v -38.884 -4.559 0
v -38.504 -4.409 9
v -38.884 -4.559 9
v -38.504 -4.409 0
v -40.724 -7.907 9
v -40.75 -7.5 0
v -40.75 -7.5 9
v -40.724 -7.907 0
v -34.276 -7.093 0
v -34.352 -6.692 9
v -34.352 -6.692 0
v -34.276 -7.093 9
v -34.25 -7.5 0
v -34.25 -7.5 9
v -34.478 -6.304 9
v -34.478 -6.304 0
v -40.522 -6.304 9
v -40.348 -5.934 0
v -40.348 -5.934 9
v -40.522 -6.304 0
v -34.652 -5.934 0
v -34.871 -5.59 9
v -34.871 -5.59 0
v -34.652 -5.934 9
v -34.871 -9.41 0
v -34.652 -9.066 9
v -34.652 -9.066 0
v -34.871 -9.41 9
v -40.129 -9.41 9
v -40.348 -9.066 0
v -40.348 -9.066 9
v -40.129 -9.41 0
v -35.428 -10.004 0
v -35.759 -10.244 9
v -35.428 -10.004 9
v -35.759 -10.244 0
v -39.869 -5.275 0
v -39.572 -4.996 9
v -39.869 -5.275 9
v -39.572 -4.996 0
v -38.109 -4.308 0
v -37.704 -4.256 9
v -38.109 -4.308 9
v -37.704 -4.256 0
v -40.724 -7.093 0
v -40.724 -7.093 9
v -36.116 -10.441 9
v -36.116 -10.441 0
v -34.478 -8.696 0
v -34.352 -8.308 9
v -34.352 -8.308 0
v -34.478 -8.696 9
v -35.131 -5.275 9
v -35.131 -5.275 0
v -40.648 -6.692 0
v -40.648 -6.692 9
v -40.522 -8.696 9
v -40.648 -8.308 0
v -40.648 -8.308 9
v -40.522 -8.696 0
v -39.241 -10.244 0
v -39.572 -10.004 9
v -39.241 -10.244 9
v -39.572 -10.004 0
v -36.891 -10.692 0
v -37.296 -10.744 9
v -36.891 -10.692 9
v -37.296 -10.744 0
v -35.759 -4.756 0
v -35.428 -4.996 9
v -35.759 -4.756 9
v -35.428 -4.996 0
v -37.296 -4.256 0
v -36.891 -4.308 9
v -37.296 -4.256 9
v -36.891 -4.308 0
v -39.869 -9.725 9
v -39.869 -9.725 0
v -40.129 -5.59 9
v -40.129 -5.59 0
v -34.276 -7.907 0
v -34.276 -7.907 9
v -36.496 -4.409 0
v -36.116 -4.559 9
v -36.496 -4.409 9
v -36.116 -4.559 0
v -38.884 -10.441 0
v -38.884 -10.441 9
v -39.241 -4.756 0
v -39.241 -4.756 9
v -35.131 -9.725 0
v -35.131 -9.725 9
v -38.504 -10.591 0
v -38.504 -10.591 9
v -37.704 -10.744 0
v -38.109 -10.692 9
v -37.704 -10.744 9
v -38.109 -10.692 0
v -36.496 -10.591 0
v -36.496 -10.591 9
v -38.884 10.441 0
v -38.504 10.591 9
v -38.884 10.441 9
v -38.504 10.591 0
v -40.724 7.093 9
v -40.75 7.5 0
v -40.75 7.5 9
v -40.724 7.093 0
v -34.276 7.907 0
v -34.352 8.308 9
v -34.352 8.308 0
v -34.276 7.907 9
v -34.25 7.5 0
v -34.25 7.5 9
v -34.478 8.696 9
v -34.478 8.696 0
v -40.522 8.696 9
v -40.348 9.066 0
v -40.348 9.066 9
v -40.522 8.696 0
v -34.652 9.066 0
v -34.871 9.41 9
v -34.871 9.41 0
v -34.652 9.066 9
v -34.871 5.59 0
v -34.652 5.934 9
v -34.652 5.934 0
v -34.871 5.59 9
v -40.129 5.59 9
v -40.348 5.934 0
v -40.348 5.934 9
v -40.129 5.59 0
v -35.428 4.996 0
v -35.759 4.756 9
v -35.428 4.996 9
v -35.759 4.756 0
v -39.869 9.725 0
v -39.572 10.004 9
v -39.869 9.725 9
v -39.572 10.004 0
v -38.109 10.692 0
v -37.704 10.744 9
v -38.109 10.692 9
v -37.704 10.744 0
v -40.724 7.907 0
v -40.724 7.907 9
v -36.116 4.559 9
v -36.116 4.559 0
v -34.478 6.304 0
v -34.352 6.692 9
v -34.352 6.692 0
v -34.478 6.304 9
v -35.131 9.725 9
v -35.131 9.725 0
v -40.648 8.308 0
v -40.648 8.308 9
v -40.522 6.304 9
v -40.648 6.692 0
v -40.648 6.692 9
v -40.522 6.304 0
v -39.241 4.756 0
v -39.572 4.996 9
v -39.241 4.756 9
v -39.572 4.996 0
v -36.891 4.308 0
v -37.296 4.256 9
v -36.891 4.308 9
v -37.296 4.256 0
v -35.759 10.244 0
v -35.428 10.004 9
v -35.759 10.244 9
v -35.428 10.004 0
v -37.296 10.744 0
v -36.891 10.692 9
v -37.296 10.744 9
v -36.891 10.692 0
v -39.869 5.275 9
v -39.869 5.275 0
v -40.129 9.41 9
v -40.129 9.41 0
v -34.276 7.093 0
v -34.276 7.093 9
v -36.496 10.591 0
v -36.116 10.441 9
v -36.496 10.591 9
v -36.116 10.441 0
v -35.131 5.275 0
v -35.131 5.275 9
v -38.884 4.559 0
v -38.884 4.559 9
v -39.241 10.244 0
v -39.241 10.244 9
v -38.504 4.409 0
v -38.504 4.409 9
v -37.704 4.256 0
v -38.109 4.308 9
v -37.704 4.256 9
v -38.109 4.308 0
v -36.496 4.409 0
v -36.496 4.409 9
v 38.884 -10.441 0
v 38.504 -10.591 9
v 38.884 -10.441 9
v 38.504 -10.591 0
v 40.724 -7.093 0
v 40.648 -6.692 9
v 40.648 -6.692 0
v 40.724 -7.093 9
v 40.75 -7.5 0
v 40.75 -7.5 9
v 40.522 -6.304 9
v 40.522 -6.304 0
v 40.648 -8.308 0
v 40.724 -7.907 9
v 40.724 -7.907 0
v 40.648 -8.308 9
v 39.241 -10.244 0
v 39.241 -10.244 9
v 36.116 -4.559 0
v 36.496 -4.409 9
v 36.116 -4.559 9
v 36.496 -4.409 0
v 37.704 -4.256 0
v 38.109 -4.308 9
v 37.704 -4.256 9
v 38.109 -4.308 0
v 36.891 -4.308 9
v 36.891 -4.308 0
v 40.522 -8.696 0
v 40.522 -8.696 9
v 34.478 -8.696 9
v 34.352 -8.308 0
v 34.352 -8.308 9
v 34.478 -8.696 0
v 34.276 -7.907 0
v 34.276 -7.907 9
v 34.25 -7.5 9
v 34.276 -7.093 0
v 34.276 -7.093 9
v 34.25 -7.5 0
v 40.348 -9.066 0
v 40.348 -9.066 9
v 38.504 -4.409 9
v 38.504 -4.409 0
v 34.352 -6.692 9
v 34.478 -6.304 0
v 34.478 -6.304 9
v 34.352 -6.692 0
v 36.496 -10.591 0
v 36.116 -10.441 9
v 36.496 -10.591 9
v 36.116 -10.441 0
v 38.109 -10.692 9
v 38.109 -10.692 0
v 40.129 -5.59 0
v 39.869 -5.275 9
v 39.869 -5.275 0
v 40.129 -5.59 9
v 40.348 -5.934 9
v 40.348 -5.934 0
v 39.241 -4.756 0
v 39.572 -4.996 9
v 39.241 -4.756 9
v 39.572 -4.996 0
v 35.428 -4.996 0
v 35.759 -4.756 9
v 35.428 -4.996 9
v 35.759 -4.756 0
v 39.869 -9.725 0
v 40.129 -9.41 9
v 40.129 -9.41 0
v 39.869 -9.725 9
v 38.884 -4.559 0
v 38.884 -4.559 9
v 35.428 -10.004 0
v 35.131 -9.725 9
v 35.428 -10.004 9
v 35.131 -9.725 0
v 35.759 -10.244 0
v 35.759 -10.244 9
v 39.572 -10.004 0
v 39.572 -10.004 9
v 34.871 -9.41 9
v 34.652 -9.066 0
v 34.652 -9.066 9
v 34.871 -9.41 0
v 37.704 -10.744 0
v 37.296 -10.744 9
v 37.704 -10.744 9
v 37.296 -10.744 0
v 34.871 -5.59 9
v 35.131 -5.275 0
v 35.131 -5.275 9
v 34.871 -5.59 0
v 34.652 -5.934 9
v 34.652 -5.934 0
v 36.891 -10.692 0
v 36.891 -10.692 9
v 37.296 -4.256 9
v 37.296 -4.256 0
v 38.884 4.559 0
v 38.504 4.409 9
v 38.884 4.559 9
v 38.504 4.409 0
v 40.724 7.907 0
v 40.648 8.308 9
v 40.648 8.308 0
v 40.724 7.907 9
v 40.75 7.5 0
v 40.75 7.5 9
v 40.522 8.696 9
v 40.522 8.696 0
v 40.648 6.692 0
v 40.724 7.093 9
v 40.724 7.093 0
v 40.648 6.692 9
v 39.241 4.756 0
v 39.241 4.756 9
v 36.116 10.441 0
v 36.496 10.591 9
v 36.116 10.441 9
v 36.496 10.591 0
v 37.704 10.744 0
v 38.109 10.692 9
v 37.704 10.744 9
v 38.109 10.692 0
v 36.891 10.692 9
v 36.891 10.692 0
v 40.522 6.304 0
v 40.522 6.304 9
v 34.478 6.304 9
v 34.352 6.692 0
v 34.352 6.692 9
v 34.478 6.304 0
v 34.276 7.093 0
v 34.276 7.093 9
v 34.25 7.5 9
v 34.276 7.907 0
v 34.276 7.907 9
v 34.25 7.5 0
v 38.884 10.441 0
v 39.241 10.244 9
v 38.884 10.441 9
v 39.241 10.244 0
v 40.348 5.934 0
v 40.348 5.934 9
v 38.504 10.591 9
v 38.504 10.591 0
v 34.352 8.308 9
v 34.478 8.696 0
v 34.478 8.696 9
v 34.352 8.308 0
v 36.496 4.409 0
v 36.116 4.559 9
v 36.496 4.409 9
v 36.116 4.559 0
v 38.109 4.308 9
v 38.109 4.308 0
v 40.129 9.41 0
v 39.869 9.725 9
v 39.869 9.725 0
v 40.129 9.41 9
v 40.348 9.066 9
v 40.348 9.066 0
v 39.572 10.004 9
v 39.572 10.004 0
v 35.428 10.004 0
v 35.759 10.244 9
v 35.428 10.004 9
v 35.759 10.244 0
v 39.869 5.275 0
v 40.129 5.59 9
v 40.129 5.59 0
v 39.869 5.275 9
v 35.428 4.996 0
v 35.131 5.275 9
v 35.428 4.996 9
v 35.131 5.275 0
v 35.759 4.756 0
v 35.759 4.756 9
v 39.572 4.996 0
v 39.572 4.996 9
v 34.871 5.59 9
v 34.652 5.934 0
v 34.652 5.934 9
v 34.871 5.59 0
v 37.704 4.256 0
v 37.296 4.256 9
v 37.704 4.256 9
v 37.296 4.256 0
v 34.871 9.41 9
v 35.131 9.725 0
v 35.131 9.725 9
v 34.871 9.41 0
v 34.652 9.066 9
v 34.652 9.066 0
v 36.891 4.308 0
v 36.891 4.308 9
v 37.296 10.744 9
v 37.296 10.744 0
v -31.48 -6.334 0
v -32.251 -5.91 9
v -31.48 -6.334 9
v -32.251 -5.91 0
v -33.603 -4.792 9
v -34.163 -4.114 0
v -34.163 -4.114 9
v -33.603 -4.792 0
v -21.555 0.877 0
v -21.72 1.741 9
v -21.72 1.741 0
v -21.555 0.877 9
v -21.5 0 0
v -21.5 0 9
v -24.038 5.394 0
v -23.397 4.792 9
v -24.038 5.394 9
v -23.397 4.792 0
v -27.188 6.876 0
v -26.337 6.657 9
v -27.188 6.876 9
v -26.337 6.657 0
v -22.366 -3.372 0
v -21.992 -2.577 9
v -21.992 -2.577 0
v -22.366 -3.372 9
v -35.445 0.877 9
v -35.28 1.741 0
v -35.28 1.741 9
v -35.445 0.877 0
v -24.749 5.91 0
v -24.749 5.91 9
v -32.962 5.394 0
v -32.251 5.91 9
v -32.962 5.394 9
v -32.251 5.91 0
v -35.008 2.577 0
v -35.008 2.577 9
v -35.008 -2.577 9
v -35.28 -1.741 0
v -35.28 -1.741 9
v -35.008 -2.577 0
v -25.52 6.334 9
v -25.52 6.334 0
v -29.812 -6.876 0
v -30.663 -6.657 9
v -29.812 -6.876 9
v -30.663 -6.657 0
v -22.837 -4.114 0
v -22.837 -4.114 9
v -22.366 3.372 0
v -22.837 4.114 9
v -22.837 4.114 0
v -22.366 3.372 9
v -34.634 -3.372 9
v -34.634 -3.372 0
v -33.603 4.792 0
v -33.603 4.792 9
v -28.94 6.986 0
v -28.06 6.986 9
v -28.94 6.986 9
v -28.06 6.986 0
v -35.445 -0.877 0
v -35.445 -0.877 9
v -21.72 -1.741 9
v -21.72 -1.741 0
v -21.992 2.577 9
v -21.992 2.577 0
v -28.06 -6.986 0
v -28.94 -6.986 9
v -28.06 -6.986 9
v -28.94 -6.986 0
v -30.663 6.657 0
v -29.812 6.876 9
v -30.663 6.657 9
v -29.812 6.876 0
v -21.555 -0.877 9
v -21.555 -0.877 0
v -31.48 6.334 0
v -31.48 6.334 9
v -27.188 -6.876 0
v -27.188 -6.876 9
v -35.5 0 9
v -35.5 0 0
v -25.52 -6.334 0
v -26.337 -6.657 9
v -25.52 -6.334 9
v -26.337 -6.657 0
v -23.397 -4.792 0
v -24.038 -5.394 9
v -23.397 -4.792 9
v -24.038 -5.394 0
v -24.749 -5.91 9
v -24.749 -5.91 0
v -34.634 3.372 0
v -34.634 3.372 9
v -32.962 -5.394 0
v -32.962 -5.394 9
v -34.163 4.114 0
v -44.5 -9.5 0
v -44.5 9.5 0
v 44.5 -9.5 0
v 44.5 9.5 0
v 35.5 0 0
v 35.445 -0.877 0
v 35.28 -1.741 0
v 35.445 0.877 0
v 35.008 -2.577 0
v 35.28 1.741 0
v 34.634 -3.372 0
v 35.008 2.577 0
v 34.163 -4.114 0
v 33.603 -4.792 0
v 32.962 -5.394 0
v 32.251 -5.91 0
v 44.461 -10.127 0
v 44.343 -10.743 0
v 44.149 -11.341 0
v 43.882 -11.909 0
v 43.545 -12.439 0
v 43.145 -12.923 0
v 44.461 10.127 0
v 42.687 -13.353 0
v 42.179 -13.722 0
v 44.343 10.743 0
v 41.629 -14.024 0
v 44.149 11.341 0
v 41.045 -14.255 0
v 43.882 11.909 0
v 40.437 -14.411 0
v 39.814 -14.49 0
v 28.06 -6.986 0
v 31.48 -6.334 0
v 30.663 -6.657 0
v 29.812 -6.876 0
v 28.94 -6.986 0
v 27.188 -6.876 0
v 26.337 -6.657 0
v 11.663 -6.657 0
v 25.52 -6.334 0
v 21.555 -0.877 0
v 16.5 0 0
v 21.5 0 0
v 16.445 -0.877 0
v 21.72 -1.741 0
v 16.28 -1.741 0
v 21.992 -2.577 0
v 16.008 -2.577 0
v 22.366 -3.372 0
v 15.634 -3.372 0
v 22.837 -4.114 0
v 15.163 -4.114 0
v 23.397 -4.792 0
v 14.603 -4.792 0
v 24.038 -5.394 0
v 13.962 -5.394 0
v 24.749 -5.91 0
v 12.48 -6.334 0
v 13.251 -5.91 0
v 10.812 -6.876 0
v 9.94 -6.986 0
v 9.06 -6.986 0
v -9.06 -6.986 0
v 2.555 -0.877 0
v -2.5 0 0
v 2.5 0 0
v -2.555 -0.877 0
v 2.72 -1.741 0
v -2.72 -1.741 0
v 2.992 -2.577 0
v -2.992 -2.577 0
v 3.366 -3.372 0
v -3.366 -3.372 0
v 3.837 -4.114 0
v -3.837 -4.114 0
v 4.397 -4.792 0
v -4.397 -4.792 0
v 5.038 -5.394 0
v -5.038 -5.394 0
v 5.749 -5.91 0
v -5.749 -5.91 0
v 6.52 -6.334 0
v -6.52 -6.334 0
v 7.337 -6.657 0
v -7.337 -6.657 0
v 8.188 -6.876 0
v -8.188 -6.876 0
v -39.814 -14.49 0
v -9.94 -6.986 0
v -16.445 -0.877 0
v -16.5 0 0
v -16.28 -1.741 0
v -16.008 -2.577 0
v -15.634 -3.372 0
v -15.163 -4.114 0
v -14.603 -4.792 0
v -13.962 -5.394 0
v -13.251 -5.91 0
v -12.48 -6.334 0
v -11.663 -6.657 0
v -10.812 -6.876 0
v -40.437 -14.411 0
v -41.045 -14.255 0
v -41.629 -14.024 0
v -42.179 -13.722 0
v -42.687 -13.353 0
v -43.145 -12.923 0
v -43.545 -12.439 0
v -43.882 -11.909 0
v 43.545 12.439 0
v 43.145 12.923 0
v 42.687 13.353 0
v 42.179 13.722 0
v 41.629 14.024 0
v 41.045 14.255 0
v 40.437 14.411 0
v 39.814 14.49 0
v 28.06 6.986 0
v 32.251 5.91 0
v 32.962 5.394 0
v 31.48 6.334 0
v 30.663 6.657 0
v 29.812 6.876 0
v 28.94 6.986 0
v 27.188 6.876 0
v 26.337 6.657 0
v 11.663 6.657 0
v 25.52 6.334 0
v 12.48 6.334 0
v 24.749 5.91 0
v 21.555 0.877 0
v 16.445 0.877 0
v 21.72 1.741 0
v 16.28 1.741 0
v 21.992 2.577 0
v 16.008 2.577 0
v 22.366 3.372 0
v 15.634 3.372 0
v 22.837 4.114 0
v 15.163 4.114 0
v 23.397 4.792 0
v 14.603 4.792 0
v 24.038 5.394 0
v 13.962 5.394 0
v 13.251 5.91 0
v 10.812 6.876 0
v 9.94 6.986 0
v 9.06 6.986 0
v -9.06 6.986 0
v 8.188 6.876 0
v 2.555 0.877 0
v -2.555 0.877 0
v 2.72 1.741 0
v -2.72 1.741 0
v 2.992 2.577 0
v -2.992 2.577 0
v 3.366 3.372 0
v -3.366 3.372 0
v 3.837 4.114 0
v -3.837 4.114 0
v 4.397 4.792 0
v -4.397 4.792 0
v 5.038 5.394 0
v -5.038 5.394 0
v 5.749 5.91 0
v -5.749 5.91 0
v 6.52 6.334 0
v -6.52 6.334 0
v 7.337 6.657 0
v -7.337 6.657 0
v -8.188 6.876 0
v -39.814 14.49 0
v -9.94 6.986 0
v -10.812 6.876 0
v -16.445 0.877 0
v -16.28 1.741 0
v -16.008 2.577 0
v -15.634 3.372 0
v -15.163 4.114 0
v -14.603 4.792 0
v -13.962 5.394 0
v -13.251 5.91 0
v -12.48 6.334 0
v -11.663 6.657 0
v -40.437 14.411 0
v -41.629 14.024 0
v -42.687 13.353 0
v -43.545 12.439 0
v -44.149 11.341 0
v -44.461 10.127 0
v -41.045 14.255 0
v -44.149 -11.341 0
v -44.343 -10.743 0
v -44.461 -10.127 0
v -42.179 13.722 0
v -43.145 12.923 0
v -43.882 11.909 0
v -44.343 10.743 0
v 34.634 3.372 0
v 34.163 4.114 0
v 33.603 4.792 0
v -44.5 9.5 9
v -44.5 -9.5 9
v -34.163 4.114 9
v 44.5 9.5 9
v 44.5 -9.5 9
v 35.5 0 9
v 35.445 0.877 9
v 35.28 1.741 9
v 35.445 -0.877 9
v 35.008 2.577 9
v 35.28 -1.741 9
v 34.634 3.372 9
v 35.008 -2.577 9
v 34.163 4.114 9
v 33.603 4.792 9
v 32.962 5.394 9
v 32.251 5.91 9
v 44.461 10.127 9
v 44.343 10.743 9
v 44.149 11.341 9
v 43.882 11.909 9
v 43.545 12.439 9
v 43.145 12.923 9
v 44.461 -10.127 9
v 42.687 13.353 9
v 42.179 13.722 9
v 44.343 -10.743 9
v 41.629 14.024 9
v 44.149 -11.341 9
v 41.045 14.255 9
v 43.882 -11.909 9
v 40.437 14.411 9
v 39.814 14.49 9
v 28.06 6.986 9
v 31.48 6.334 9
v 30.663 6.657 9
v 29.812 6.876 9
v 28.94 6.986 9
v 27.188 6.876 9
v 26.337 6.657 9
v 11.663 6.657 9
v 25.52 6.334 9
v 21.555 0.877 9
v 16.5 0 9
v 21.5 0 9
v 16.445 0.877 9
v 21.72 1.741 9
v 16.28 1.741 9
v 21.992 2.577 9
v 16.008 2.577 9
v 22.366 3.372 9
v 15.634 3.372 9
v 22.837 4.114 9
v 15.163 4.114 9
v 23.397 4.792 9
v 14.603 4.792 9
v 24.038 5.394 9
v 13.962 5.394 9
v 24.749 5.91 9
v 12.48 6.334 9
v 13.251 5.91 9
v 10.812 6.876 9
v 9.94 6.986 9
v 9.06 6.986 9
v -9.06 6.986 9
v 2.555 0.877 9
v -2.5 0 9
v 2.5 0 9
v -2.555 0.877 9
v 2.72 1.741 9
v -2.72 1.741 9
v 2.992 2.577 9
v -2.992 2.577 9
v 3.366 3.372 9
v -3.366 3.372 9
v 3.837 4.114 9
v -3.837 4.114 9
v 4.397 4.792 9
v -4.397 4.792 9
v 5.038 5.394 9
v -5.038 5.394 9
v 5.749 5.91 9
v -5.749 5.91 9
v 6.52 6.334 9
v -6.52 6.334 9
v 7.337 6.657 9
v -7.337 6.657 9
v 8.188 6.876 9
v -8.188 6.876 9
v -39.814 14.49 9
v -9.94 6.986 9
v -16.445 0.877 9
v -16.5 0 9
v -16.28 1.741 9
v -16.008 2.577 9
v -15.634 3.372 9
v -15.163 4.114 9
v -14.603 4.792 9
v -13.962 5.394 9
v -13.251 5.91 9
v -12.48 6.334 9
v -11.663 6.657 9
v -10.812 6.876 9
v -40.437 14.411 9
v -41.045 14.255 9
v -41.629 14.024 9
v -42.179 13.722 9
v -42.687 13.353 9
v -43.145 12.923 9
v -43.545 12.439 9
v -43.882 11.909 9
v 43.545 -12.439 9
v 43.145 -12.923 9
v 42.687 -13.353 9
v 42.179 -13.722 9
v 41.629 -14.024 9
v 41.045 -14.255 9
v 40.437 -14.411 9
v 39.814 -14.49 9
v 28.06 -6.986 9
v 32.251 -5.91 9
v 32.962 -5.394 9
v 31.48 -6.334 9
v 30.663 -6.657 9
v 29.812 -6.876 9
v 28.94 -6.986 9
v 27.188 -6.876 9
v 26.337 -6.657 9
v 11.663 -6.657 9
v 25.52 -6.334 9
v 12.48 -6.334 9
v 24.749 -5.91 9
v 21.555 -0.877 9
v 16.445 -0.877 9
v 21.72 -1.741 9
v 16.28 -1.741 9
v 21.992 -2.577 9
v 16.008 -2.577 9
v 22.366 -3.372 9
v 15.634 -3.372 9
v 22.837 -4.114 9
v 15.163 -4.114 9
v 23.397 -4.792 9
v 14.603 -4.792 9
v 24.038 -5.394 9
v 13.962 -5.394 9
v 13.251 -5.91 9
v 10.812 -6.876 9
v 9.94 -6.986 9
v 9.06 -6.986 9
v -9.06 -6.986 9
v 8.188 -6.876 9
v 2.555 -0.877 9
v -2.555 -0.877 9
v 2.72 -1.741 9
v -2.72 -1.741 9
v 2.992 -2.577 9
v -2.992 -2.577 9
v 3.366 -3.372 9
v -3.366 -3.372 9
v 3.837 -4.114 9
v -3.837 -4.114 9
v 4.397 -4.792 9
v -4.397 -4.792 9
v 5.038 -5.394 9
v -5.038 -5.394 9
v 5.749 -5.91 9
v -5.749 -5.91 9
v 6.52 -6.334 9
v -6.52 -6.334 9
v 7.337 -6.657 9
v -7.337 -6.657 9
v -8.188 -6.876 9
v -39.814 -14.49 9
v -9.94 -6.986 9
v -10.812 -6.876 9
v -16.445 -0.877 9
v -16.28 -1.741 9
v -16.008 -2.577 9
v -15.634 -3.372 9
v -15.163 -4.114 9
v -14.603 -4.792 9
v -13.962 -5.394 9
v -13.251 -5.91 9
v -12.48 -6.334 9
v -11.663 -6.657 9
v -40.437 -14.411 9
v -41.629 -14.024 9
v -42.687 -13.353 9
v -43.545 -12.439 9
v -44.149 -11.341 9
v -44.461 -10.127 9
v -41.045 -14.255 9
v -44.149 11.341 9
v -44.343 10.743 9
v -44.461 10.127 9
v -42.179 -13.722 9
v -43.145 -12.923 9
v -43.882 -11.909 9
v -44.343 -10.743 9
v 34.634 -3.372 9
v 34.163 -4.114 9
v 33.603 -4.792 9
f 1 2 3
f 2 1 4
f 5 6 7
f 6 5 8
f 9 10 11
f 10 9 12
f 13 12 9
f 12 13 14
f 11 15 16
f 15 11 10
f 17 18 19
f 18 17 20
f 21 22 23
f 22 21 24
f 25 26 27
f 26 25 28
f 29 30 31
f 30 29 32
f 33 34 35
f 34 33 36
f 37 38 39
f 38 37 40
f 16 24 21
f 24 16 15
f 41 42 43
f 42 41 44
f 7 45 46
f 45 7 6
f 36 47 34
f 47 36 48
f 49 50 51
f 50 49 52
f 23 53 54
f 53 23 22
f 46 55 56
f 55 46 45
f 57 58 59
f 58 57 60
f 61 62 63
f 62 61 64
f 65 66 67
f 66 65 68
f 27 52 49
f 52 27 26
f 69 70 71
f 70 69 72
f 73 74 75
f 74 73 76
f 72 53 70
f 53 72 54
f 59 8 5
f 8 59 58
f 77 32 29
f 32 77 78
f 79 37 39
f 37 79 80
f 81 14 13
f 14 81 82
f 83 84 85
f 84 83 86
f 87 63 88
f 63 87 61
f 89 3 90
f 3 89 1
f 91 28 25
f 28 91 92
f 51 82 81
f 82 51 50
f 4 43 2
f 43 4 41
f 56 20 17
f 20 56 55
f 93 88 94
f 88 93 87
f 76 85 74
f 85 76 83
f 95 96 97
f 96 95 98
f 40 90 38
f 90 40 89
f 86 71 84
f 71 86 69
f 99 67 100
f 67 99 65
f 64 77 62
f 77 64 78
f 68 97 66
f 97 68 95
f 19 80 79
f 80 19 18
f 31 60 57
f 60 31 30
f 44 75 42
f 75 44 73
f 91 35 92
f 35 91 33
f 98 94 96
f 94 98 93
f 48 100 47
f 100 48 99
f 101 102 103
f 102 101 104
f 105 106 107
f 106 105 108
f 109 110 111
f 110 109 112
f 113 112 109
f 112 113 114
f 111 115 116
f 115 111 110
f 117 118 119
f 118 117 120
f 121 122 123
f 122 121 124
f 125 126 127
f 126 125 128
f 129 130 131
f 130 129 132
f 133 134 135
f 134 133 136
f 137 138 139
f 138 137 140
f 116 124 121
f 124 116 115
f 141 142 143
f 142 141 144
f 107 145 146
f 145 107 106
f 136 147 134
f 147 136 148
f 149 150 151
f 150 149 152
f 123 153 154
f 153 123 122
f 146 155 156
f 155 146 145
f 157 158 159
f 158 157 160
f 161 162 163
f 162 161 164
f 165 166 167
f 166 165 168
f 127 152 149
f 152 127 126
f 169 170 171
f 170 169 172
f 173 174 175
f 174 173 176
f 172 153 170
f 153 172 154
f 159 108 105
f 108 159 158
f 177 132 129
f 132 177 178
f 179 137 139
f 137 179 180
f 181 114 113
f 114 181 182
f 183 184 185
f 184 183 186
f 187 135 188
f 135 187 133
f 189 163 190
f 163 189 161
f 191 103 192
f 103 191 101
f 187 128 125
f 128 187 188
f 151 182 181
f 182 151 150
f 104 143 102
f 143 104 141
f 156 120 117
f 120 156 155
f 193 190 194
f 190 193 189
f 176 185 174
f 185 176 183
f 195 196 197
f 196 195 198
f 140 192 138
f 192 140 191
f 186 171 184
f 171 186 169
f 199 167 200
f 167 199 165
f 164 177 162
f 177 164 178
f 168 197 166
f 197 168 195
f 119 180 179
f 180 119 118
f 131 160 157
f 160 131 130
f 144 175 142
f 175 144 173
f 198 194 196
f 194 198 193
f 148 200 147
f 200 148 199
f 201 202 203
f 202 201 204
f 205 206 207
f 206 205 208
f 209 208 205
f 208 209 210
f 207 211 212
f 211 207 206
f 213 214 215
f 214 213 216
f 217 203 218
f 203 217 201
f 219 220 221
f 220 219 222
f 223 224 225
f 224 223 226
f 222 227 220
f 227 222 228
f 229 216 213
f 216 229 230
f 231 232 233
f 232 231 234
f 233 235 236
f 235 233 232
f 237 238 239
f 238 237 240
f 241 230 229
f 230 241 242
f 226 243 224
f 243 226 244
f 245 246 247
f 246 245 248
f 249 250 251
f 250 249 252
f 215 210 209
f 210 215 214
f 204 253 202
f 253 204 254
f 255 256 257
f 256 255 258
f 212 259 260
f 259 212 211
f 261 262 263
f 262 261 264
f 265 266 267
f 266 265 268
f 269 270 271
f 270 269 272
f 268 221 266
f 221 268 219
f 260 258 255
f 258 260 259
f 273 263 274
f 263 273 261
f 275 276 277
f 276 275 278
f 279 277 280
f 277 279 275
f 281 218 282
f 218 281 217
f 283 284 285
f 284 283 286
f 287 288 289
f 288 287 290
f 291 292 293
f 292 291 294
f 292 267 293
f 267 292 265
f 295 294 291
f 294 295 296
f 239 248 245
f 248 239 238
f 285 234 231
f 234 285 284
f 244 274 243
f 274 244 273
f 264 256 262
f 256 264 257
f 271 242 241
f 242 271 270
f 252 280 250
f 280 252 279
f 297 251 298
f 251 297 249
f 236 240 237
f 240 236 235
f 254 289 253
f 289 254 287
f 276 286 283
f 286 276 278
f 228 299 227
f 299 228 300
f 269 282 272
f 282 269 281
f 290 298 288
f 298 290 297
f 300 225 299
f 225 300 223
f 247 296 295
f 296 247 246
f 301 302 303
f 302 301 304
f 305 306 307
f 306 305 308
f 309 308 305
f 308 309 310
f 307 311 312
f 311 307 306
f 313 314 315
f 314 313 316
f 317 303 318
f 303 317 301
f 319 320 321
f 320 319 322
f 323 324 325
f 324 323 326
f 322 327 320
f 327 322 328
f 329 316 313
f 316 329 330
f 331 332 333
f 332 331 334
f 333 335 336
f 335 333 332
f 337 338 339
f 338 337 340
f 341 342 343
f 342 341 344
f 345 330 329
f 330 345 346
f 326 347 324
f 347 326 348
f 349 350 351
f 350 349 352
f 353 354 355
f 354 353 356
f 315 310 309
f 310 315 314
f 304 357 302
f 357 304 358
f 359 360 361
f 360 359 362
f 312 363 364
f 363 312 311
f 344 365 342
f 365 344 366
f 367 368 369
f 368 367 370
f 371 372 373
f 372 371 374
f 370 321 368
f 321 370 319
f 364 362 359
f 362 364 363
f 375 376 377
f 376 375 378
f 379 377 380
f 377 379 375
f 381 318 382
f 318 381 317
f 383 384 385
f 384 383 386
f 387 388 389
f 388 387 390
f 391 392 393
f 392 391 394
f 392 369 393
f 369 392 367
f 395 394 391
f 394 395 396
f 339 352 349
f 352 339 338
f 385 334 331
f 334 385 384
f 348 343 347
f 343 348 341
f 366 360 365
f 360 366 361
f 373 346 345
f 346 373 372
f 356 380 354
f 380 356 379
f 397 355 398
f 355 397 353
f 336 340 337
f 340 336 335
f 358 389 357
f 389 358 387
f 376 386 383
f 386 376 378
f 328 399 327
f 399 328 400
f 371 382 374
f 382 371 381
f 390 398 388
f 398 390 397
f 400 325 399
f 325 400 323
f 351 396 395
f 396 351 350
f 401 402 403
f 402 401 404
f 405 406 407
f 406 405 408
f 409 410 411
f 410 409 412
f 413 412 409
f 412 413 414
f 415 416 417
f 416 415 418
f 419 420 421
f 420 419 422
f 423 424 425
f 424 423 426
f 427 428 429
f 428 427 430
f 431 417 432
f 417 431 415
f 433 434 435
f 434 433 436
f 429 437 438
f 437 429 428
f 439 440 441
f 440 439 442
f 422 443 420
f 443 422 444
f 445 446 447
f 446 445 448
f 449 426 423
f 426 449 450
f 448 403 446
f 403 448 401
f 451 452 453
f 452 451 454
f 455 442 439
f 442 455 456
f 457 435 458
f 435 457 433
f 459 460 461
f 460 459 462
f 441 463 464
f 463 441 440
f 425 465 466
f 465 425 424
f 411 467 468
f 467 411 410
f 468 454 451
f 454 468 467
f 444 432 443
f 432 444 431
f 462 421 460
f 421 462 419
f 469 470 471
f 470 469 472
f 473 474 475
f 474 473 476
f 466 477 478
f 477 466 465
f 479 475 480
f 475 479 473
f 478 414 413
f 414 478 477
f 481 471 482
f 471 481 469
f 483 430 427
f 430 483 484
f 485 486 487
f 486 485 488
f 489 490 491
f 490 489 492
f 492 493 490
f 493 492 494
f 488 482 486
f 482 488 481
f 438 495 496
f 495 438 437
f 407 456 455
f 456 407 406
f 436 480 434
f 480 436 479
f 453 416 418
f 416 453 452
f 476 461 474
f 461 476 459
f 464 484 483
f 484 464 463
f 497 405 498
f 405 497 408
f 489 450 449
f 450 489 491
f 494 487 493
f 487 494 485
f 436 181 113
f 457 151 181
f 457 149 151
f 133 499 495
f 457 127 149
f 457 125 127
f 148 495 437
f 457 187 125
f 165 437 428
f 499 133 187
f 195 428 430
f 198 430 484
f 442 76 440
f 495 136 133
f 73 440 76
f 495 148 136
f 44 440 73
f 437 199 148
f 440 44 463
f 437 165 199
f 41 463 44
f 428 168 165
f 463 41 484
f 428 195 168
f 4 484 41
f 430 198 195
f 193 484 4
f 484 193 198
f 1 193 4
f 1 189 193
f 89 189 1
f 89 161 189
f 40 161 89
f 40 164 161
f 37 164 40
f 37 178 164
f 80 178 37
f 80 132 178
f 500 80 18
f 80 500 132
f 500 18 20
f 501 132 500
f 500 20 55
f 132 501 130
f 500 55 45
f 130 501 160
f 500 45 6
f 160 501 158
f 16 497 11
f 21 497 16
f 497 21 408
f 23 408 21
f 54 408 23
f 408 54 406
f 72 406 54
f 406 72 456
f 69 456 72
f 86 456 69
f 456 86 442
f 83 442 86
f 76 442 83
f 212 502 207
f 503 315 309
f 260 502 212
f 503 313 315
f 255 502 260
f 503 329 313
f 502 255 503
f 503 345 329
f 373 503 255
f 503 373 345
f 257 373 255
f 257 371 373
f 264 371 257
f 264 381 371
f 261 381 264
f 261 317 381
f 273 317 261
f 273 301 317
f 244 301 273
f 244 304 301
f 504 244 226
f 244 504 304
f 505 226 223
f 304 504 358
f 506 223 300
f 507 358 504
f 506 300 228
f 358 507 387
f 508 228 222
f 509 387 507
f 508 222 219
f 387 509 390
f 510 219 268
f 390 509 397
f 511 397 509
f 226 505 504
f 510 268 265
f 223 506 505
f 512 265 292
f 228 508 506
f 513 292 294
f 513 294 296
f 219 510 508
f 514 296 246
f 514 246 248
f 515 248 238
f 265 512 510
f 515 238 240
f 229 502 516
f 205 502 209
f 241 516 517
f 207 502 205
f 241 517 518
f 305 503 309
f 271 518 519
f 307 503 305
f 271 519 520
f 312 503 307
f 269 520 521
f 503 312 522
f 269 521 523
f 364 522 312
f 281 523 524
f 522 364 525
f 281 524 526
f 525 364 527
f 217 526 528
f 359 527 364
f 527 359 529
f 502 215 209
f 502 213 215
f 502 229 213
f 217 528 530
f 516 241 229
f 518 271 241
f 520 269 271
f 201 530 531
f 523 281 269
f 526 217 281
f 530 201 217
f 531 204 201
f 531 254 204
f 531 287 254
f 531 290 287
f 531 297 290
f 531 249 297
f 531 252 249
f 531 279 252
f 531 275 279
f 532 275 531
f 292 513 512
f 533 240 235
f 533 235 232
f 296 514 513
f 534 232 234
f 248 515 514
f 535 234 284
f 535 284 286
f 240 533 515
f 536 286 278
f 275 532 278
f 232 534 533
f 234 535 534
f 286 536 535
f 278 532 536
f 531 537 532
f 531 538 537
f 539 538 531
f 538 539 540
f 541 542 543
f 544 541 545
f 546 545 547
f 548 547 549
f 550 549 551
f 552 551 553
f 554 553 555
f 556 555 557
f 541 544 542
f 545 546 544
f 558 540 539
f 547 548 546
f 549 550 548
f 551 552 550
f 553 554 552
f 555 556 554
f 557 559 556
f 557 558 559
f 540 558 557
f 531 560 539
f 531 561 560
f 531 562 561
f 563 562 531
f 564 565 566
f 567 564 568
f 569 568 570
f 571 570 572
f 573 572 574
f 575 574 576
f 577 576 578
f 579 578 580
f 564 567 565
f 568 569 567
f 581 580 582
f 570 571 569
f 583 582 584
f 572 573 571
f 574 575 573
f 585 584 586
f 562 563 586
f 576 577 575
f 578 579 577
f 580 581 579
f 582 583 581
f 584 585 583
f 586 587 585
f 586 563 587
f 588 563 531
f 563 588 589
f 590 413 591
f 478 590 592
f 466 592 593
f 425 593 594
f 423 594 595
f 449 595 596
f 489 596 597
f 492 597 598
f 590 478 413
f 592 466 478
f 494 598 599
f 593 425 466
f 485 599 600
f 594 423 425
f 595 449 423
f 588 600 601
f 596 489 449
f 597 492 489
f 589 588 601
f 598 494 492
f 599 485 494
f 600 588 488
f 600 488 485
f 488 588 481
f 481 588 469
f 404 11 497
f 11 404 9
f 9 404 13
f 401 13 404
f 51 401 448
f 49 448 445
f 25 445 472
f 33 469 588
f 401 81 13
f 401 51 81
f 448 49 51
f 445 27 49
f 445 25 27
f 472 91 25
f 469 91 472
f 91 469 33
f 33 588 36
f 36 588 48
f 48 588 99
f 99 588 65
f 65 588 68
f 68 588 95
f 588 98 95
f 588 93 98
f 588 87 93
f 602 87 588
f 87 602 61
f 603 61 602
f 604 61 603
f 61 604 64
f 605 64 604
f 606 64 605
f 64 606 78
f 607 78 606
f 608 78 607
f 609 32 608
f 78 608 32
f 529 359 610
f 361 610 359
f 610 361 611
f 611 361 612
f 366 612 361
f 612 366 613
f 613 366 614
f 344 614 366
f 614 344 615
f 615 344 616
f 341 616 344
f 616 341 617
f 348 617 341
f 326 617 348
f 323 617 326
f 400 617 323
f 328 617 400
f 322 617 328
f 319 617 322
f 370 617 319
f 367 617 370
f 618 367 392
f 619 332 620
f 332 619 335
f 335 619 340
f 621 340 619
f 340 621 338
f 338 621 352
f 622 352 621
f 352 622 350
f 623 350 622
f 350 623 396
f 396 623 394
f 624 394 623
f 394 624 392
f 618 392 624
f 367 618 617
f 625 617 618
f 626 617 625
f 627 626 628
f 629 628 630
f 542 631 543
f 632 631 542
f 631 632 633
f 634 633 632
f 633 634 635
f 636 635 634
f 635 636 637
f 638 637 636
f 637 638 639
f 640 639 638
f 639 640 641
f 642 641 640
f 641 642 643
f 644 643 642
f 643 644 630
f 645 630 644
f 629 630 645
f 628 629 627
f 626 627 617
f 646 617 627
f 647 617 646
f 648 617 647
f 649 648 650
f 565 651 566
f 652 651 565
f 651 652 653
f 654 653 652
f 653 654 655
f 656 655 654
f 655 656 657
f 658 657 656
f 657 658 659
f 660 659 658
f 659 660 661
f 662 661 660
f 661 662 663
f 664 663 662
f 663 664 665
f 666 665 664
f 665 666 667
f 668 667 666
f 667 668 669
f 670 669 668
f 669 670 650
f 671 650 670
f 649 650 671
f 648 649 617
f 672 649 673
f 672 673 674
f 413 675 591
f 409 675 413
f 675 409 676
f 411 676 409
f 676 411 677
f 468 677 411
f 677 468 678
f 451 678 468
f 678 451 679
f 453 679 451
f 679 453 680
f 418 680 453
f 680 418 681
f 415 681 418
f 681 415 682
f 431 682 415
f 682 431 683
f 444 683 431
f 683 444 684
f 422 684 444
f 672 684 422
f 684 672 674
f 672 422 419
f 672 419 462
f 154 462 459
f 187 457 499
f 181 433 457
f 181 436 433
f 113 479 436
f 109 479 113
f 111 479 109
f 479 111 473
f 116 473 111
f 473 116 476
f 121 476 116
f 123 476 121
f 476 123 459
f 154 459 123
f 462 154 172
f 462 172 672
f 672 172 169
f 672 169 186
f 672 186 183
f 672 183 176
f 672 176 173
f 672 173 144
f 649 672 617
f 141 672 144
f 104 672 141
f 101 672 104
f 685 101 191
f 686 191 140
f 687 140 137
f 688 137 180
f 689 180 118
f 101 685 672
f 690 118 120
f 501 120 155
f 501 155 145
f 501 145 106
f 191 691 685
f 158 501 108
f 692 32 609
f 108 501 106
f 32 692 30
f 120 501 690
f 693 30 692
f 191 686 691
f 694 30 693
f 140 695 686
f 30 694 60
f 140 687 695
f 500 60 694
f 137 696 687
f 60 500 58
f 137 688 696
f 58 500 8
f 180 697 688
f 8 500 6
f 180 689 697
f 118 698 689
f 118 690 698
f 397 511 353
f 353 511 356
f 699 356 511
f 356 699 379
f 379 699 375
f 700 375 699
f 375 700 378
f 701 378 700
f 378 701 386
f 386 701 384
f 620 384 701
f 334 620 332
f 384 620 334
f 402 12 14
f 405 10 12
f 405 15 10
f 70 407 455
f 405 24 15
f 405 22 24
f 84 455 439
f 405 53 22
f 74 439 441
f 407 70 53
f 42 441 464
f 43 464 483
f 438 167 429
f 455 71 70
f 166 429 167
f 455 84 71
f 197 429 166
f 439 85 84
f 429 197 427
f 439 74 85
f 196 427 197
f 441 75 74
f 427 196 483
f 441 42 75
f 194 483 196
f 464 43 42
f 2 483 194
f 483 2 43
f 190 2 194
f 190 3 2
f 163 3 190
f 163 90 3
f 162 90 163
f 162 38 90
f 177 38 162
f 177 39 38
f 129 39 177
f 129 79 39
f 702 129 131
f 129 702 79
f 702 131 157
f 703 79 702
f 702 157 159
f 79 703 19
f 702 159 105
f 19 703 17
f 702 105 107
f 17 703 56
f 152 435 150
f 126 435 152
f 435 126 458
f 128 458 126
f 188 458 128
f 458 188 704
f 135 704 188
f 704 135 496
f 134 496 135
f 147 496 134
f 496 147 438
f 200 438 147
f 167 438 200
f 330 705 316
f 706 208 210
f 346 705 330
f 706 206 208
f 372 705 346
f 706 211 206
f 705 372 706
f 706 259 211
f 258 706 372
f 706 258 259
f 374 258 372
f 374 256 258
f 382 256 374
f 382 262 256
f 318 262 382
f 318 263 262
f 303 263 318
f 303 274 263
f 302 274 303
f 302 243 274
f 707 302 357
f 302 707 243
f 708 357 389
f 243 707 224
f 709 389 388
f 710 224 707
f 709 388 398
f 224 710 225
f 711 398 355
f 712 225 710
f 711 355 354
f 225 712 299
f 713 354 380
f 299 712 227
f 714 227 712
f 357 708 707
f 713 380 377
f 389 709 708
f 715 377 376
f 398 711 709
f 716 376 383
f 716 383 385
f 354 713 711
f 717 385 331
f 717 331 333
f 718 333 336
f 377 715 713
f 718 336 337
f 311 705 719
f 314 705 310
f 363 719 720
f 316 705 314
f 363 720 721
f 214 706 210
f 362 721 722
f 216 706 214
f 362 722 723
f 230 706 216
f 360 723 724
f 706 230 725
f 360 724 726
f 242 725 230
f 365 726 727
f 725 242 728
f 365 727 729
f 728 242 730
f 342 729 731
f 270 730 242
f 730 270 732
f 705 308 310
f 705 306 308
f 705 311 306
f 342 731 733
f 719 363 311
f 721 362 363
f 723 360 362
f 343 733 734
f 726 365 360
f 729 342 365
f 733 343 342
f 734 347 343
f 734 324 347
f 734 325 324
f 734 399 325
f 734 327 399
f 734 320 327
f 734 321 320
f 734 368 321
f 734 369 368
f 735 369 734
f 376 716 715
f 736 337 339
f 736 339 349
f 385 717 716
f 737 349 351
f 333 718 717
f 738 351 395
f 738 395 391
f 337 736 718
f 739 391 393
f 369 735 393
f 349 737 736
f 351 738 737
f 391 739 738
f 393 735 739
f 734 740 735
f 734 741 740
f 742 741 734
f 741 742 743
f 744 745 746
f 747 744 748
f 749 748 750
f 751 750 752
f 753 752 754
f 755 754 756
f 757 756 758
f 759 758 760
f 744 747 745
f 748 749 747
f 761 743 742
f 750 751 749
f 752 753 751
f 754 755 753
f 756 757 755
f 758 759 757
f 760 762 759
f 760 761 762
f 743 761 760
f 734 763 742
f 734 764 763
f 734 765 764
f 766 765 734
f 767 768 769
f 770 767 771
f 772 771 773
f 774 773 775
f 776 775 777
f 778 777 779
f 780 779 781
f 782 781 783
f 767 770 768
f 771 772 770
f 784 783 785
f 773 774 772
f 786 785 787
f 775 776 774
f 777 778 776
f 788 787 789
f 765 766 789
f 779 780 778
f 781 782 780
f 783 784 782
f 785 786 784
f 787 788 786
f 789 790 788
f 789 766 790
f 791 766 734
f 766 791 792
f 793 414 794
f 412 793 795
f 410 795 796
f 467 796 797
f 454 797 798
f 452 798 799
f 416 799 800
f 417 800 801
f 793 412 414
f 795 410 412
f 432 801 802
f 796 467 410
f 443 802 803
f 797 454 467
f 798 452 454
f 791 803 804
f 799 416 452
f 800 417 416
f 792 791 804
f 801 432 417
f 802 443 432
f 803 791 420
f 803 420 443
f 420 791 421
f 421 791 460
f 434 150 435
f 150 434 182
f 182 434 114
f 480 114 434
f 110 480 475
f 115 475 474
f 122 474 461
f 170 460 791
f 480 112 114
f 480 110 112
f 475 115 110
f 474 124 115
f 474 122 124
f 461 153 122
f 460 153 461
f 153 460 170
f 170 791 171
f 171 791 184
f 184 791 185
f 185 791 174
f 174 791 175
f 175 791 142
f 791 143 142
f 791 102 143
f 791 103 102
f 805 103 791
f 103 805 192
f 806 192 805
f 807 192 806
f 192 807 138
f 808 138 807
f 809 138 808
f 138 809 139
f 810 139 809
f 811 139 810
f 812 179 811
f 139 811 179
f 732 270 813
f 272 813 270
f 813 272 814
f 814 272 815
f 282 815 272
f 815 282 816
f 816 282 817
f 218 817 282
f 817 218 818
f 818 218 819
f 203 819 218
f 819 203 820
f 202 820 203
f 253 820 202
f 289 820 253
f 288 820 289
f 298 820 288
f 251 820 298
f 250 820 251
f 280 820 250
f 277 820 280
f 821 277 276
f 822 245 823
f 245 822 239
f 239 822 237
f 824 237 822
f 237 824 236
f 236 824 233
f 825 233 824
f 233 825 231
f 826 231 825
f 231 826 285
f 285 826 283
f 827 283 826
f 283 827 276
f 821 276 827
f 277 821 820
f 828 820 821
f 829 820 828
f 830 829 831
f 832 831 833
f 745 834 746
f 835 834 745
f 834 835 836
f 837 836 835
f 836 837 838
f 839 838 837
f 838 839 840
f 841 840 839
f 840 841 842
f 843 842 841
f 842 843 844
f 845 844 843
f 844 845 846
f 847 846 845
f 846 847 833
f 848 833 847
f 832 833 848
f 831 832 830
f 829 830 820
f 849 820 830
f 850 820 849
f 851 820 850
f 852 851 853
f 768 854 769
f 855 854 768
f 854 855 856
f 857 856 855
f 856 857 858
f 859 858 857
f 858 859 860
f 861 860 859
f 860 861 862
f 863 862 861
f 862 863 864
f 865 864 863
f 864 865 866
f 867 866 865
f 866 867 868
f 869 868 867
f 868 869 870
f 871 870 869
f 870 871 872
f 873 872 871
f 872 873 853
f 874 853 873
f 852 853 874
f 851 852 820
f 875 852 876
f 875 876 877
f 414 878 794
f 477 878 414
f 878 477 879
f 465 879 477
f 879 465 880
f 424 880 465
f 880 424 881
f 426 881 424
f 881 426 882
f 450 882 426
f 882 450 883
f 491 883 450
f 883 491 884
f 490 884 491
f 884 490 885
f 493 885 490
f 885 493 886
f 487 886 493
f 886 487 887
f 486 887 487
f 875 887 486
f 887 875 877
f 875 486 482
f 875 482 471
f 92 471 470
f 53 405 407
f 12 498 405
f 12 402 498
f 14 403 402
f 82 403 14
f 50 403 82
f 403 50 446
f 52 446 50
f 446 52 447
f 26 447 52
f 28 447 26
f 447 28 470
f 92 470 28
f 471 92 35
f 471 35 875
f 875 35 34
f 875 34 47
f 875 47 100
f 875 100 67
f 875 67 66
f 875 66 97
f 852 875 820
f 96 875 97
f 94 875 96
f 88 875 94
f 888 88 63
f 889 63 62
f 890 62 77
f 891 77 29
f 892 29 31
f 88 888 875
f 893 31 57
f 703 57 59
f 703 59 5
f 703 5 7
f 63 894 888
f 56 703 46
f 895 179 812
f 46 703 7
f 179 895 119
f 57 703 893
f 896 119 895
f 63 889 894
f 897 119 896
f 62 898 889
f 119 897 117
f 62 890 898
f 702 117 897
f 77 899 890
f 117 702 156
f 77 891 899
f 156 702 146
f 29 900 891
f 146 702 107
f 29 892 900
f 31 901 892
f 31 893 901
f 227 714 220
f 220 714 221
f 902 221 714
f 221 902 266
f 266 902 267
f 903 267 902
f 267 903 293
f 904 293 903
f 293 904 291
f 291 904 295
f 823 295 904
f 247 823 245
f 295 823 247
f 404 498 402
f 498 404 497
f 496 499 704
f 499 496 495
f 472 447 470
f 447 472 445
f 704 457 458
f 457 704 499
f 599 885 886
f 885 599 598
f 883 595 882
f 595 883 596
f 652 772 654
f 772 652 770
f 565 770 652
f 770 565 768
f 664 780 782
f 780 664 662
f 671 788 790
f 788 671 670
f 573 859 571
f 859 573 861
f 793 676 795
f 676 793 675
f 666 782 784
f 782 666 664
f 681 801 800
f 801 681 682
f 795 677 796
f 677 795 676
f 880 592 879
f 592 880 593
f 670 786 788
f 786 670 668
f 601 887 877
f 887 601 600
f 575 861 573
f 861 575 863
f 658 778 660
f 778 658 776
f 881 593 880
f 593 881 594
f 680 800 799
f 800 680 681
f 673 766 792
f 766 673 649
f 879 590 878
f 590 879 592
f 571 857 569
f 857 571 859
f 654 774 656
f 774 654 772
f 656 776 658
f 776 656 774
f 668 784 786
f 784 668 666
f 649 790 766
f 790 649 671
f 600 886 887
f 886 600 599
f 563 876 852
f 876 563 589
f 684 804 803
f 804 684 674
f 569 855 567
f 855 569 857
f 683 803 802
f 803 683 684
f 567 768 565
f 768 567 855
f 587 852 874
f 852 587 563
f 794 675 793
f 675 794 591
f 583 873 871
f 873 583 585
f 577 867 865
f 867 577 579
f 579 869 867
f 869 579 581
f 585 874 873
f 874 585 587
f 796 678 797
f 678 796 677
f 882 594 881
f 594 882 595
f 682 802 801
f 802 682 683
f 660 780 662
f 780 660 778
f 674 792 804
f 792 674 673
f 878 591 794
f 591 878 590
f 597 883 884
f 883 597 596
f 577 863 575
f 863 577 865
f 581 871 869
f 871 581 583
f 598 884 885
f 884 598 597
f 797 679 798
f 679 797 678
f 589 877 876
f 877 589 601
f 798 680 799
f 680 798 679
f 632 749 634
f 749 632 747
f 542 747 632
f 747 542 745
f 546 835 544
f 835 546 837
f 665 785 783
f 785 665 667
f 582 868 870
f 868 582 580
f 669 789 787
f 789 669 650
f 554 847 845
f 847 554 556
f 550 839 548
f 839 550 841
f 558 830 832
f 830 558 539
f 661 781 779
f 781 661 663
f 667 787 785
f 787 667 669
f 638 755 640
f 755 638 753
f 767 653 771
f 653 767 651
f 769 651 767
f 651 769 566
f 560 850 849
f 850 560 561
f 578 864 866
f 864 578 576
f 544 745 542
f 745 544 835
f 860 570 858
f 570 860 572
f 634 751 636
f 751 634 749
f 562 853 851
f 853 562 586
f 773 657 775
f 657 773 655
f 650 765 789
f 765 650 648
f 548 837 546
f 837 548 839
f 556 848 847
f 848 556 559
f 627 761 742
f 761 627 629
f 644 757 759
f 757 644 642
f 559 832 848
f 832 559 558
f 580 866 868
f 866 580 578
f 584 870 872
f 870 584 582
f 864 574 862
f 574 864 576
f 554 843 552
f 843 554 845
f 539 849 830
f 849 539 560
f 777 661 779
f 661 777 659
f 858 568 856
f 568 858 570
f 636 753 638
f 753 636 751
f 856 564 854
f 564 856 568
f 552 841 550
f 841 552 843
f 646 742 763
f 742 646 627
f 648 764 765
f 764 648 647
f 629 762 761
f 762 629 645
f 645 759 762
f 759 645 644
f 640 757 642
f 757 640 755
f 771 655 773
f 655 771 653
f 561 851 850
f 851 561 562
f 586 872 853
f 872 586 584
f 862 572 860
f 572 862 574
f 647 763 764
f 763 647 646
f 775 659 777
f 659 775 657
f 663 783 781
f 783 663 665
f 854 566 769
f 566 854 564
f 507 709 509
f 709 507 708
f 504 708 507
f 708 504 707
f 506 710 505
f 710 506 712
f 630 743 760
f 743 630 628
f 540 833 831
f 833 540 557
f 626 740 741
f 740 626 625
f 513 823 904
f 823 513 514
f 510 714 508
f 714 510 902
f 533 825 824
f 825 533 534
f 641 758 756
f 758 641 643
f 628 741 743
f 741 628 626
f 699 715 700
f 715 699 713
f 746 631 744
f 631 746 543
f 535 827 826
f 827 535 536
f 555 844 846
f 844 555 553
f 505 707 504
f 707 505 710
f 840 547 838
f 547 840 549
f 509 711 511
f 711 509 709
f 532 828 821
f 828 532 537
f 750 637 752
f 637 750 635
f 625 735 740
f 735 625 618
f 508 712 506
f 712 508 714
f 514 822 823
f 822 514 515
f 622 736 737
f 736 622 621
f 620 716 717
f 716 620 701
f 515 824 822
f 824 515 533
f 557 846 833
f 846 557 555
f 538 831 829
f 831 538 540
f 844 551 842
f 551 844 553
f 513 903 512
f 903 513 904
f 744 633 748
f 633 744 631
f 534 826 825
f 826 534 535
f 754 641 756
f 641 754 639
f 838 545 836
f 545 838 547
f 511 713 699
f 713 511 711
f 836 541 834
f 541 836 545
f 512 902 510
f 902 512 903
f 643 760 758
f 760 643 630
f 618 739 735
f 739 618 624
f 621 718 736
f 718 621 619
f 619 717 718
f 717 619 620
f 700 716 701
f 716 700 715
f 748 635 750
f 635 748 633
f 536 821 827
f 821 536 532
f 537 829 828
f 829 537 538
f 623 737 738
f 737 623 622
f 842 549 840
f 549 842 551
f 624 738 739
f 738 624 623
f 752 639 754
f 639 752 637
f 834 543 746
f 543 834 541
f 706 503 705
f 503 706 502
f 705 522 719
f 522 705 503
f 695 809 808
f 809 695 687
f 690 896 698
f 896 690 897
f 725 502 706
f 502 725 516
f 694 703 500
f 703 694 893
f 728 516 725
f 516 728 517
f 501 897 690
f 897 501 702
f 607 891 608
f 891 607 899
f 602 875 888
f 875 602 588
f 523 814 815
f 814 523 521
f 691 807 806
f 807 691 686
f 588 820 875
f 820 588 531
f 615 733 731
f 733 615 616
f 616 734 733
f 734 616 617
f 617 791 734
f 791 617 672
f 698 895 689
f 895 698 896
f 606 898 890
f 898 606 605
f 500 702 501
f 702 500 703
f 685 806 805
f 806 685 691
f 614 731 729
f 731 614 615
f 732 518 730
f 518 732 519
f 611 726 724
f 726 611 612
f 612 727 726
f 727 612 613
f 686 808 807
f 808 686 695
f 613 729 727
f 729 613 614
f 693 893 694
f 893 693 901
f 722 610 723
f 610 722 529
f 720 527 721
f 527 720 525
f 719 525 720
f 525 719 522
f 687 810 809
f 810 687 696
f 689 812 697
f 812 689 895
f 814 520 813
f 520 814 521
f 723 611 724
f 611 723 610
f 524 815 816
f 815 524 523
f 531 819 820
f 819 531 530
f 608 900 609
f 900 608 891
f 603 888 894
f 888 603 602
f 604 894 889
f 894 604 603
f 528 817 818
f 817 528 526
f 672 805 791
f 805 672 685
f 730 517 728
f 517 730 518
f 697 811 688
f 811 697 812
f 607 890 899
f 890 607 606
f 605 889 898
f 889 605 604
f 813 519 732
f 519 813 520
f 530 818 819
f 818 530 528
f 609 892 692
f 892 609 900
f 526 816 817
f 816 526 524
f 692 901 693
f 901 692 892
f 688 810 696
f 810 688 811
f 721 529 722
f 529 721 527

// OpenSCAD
$fn = 50;

difference() {
	union() {
		hull() {
			translate(v = [-39.5, 9.5, 0]) {
				cylinder(h = 9, r = 5);
			}
			translate(v = [39.5, 9.5, 0]) {
				cylinder(h = 9, r = 5);
			}
			translate(v = [-39.5, -9.5, 0]) {
				cylinder(h = 9, r = 5);
			}
			translate(v = [39.5, -9.5, 0]) {
				cylinder(h = 9, r = 5);
			}
		}
	}
	union() {
		translate(v = [-37.5, -7.5, -100.0]) {
			cylinder(h = 200, r = 3.25);
		}
		translate(v = [-37.5, 7.5, -100.0]) {
			cylinder(h = 200, r = 3.25);
		}
		translate(v = [37.5, -7.5, -100.0]) {
			cylinder(h = 200, r = 3.25);
		}
		translate(v = [37.5, 7.5, -100.0]) {
			cylinder(h = 200, r = 3.25);
		}
		translate(v = [-37.5, -7.5, -100.0]) {
			cylinder(h = 200, r = 1.8);
		}
		translate(v = [-37.5, 7.5, -100.0]) {
			cylinder(h = 200, r = 1.8);
		}
		translate(v = [37.5, -7.5, -100.0]) {
			cylinder(h = 200, r = 1.8);
		}
		translate(v = [37.5, 7.5, -100.0]) {
			cylinder(h = 200, r = 1.8);
		}
		translate(v = [-28.5, 0, 0.0]) {
			cylinder(h = 9, r = 7.0);
		}
		translate(v = [-9.5, 0, 0.0]) {
			cylinder(h = 9, r = 7.0);
		}
		translate(v = [9.5, 0, 0.0]) {
			cylinder(h = 9, r = 7.0);
		}
		translate(v = [28.5, 0, 0.0]) {
			cylinder(h = 9, r = 7.0);
		}
	}
}
